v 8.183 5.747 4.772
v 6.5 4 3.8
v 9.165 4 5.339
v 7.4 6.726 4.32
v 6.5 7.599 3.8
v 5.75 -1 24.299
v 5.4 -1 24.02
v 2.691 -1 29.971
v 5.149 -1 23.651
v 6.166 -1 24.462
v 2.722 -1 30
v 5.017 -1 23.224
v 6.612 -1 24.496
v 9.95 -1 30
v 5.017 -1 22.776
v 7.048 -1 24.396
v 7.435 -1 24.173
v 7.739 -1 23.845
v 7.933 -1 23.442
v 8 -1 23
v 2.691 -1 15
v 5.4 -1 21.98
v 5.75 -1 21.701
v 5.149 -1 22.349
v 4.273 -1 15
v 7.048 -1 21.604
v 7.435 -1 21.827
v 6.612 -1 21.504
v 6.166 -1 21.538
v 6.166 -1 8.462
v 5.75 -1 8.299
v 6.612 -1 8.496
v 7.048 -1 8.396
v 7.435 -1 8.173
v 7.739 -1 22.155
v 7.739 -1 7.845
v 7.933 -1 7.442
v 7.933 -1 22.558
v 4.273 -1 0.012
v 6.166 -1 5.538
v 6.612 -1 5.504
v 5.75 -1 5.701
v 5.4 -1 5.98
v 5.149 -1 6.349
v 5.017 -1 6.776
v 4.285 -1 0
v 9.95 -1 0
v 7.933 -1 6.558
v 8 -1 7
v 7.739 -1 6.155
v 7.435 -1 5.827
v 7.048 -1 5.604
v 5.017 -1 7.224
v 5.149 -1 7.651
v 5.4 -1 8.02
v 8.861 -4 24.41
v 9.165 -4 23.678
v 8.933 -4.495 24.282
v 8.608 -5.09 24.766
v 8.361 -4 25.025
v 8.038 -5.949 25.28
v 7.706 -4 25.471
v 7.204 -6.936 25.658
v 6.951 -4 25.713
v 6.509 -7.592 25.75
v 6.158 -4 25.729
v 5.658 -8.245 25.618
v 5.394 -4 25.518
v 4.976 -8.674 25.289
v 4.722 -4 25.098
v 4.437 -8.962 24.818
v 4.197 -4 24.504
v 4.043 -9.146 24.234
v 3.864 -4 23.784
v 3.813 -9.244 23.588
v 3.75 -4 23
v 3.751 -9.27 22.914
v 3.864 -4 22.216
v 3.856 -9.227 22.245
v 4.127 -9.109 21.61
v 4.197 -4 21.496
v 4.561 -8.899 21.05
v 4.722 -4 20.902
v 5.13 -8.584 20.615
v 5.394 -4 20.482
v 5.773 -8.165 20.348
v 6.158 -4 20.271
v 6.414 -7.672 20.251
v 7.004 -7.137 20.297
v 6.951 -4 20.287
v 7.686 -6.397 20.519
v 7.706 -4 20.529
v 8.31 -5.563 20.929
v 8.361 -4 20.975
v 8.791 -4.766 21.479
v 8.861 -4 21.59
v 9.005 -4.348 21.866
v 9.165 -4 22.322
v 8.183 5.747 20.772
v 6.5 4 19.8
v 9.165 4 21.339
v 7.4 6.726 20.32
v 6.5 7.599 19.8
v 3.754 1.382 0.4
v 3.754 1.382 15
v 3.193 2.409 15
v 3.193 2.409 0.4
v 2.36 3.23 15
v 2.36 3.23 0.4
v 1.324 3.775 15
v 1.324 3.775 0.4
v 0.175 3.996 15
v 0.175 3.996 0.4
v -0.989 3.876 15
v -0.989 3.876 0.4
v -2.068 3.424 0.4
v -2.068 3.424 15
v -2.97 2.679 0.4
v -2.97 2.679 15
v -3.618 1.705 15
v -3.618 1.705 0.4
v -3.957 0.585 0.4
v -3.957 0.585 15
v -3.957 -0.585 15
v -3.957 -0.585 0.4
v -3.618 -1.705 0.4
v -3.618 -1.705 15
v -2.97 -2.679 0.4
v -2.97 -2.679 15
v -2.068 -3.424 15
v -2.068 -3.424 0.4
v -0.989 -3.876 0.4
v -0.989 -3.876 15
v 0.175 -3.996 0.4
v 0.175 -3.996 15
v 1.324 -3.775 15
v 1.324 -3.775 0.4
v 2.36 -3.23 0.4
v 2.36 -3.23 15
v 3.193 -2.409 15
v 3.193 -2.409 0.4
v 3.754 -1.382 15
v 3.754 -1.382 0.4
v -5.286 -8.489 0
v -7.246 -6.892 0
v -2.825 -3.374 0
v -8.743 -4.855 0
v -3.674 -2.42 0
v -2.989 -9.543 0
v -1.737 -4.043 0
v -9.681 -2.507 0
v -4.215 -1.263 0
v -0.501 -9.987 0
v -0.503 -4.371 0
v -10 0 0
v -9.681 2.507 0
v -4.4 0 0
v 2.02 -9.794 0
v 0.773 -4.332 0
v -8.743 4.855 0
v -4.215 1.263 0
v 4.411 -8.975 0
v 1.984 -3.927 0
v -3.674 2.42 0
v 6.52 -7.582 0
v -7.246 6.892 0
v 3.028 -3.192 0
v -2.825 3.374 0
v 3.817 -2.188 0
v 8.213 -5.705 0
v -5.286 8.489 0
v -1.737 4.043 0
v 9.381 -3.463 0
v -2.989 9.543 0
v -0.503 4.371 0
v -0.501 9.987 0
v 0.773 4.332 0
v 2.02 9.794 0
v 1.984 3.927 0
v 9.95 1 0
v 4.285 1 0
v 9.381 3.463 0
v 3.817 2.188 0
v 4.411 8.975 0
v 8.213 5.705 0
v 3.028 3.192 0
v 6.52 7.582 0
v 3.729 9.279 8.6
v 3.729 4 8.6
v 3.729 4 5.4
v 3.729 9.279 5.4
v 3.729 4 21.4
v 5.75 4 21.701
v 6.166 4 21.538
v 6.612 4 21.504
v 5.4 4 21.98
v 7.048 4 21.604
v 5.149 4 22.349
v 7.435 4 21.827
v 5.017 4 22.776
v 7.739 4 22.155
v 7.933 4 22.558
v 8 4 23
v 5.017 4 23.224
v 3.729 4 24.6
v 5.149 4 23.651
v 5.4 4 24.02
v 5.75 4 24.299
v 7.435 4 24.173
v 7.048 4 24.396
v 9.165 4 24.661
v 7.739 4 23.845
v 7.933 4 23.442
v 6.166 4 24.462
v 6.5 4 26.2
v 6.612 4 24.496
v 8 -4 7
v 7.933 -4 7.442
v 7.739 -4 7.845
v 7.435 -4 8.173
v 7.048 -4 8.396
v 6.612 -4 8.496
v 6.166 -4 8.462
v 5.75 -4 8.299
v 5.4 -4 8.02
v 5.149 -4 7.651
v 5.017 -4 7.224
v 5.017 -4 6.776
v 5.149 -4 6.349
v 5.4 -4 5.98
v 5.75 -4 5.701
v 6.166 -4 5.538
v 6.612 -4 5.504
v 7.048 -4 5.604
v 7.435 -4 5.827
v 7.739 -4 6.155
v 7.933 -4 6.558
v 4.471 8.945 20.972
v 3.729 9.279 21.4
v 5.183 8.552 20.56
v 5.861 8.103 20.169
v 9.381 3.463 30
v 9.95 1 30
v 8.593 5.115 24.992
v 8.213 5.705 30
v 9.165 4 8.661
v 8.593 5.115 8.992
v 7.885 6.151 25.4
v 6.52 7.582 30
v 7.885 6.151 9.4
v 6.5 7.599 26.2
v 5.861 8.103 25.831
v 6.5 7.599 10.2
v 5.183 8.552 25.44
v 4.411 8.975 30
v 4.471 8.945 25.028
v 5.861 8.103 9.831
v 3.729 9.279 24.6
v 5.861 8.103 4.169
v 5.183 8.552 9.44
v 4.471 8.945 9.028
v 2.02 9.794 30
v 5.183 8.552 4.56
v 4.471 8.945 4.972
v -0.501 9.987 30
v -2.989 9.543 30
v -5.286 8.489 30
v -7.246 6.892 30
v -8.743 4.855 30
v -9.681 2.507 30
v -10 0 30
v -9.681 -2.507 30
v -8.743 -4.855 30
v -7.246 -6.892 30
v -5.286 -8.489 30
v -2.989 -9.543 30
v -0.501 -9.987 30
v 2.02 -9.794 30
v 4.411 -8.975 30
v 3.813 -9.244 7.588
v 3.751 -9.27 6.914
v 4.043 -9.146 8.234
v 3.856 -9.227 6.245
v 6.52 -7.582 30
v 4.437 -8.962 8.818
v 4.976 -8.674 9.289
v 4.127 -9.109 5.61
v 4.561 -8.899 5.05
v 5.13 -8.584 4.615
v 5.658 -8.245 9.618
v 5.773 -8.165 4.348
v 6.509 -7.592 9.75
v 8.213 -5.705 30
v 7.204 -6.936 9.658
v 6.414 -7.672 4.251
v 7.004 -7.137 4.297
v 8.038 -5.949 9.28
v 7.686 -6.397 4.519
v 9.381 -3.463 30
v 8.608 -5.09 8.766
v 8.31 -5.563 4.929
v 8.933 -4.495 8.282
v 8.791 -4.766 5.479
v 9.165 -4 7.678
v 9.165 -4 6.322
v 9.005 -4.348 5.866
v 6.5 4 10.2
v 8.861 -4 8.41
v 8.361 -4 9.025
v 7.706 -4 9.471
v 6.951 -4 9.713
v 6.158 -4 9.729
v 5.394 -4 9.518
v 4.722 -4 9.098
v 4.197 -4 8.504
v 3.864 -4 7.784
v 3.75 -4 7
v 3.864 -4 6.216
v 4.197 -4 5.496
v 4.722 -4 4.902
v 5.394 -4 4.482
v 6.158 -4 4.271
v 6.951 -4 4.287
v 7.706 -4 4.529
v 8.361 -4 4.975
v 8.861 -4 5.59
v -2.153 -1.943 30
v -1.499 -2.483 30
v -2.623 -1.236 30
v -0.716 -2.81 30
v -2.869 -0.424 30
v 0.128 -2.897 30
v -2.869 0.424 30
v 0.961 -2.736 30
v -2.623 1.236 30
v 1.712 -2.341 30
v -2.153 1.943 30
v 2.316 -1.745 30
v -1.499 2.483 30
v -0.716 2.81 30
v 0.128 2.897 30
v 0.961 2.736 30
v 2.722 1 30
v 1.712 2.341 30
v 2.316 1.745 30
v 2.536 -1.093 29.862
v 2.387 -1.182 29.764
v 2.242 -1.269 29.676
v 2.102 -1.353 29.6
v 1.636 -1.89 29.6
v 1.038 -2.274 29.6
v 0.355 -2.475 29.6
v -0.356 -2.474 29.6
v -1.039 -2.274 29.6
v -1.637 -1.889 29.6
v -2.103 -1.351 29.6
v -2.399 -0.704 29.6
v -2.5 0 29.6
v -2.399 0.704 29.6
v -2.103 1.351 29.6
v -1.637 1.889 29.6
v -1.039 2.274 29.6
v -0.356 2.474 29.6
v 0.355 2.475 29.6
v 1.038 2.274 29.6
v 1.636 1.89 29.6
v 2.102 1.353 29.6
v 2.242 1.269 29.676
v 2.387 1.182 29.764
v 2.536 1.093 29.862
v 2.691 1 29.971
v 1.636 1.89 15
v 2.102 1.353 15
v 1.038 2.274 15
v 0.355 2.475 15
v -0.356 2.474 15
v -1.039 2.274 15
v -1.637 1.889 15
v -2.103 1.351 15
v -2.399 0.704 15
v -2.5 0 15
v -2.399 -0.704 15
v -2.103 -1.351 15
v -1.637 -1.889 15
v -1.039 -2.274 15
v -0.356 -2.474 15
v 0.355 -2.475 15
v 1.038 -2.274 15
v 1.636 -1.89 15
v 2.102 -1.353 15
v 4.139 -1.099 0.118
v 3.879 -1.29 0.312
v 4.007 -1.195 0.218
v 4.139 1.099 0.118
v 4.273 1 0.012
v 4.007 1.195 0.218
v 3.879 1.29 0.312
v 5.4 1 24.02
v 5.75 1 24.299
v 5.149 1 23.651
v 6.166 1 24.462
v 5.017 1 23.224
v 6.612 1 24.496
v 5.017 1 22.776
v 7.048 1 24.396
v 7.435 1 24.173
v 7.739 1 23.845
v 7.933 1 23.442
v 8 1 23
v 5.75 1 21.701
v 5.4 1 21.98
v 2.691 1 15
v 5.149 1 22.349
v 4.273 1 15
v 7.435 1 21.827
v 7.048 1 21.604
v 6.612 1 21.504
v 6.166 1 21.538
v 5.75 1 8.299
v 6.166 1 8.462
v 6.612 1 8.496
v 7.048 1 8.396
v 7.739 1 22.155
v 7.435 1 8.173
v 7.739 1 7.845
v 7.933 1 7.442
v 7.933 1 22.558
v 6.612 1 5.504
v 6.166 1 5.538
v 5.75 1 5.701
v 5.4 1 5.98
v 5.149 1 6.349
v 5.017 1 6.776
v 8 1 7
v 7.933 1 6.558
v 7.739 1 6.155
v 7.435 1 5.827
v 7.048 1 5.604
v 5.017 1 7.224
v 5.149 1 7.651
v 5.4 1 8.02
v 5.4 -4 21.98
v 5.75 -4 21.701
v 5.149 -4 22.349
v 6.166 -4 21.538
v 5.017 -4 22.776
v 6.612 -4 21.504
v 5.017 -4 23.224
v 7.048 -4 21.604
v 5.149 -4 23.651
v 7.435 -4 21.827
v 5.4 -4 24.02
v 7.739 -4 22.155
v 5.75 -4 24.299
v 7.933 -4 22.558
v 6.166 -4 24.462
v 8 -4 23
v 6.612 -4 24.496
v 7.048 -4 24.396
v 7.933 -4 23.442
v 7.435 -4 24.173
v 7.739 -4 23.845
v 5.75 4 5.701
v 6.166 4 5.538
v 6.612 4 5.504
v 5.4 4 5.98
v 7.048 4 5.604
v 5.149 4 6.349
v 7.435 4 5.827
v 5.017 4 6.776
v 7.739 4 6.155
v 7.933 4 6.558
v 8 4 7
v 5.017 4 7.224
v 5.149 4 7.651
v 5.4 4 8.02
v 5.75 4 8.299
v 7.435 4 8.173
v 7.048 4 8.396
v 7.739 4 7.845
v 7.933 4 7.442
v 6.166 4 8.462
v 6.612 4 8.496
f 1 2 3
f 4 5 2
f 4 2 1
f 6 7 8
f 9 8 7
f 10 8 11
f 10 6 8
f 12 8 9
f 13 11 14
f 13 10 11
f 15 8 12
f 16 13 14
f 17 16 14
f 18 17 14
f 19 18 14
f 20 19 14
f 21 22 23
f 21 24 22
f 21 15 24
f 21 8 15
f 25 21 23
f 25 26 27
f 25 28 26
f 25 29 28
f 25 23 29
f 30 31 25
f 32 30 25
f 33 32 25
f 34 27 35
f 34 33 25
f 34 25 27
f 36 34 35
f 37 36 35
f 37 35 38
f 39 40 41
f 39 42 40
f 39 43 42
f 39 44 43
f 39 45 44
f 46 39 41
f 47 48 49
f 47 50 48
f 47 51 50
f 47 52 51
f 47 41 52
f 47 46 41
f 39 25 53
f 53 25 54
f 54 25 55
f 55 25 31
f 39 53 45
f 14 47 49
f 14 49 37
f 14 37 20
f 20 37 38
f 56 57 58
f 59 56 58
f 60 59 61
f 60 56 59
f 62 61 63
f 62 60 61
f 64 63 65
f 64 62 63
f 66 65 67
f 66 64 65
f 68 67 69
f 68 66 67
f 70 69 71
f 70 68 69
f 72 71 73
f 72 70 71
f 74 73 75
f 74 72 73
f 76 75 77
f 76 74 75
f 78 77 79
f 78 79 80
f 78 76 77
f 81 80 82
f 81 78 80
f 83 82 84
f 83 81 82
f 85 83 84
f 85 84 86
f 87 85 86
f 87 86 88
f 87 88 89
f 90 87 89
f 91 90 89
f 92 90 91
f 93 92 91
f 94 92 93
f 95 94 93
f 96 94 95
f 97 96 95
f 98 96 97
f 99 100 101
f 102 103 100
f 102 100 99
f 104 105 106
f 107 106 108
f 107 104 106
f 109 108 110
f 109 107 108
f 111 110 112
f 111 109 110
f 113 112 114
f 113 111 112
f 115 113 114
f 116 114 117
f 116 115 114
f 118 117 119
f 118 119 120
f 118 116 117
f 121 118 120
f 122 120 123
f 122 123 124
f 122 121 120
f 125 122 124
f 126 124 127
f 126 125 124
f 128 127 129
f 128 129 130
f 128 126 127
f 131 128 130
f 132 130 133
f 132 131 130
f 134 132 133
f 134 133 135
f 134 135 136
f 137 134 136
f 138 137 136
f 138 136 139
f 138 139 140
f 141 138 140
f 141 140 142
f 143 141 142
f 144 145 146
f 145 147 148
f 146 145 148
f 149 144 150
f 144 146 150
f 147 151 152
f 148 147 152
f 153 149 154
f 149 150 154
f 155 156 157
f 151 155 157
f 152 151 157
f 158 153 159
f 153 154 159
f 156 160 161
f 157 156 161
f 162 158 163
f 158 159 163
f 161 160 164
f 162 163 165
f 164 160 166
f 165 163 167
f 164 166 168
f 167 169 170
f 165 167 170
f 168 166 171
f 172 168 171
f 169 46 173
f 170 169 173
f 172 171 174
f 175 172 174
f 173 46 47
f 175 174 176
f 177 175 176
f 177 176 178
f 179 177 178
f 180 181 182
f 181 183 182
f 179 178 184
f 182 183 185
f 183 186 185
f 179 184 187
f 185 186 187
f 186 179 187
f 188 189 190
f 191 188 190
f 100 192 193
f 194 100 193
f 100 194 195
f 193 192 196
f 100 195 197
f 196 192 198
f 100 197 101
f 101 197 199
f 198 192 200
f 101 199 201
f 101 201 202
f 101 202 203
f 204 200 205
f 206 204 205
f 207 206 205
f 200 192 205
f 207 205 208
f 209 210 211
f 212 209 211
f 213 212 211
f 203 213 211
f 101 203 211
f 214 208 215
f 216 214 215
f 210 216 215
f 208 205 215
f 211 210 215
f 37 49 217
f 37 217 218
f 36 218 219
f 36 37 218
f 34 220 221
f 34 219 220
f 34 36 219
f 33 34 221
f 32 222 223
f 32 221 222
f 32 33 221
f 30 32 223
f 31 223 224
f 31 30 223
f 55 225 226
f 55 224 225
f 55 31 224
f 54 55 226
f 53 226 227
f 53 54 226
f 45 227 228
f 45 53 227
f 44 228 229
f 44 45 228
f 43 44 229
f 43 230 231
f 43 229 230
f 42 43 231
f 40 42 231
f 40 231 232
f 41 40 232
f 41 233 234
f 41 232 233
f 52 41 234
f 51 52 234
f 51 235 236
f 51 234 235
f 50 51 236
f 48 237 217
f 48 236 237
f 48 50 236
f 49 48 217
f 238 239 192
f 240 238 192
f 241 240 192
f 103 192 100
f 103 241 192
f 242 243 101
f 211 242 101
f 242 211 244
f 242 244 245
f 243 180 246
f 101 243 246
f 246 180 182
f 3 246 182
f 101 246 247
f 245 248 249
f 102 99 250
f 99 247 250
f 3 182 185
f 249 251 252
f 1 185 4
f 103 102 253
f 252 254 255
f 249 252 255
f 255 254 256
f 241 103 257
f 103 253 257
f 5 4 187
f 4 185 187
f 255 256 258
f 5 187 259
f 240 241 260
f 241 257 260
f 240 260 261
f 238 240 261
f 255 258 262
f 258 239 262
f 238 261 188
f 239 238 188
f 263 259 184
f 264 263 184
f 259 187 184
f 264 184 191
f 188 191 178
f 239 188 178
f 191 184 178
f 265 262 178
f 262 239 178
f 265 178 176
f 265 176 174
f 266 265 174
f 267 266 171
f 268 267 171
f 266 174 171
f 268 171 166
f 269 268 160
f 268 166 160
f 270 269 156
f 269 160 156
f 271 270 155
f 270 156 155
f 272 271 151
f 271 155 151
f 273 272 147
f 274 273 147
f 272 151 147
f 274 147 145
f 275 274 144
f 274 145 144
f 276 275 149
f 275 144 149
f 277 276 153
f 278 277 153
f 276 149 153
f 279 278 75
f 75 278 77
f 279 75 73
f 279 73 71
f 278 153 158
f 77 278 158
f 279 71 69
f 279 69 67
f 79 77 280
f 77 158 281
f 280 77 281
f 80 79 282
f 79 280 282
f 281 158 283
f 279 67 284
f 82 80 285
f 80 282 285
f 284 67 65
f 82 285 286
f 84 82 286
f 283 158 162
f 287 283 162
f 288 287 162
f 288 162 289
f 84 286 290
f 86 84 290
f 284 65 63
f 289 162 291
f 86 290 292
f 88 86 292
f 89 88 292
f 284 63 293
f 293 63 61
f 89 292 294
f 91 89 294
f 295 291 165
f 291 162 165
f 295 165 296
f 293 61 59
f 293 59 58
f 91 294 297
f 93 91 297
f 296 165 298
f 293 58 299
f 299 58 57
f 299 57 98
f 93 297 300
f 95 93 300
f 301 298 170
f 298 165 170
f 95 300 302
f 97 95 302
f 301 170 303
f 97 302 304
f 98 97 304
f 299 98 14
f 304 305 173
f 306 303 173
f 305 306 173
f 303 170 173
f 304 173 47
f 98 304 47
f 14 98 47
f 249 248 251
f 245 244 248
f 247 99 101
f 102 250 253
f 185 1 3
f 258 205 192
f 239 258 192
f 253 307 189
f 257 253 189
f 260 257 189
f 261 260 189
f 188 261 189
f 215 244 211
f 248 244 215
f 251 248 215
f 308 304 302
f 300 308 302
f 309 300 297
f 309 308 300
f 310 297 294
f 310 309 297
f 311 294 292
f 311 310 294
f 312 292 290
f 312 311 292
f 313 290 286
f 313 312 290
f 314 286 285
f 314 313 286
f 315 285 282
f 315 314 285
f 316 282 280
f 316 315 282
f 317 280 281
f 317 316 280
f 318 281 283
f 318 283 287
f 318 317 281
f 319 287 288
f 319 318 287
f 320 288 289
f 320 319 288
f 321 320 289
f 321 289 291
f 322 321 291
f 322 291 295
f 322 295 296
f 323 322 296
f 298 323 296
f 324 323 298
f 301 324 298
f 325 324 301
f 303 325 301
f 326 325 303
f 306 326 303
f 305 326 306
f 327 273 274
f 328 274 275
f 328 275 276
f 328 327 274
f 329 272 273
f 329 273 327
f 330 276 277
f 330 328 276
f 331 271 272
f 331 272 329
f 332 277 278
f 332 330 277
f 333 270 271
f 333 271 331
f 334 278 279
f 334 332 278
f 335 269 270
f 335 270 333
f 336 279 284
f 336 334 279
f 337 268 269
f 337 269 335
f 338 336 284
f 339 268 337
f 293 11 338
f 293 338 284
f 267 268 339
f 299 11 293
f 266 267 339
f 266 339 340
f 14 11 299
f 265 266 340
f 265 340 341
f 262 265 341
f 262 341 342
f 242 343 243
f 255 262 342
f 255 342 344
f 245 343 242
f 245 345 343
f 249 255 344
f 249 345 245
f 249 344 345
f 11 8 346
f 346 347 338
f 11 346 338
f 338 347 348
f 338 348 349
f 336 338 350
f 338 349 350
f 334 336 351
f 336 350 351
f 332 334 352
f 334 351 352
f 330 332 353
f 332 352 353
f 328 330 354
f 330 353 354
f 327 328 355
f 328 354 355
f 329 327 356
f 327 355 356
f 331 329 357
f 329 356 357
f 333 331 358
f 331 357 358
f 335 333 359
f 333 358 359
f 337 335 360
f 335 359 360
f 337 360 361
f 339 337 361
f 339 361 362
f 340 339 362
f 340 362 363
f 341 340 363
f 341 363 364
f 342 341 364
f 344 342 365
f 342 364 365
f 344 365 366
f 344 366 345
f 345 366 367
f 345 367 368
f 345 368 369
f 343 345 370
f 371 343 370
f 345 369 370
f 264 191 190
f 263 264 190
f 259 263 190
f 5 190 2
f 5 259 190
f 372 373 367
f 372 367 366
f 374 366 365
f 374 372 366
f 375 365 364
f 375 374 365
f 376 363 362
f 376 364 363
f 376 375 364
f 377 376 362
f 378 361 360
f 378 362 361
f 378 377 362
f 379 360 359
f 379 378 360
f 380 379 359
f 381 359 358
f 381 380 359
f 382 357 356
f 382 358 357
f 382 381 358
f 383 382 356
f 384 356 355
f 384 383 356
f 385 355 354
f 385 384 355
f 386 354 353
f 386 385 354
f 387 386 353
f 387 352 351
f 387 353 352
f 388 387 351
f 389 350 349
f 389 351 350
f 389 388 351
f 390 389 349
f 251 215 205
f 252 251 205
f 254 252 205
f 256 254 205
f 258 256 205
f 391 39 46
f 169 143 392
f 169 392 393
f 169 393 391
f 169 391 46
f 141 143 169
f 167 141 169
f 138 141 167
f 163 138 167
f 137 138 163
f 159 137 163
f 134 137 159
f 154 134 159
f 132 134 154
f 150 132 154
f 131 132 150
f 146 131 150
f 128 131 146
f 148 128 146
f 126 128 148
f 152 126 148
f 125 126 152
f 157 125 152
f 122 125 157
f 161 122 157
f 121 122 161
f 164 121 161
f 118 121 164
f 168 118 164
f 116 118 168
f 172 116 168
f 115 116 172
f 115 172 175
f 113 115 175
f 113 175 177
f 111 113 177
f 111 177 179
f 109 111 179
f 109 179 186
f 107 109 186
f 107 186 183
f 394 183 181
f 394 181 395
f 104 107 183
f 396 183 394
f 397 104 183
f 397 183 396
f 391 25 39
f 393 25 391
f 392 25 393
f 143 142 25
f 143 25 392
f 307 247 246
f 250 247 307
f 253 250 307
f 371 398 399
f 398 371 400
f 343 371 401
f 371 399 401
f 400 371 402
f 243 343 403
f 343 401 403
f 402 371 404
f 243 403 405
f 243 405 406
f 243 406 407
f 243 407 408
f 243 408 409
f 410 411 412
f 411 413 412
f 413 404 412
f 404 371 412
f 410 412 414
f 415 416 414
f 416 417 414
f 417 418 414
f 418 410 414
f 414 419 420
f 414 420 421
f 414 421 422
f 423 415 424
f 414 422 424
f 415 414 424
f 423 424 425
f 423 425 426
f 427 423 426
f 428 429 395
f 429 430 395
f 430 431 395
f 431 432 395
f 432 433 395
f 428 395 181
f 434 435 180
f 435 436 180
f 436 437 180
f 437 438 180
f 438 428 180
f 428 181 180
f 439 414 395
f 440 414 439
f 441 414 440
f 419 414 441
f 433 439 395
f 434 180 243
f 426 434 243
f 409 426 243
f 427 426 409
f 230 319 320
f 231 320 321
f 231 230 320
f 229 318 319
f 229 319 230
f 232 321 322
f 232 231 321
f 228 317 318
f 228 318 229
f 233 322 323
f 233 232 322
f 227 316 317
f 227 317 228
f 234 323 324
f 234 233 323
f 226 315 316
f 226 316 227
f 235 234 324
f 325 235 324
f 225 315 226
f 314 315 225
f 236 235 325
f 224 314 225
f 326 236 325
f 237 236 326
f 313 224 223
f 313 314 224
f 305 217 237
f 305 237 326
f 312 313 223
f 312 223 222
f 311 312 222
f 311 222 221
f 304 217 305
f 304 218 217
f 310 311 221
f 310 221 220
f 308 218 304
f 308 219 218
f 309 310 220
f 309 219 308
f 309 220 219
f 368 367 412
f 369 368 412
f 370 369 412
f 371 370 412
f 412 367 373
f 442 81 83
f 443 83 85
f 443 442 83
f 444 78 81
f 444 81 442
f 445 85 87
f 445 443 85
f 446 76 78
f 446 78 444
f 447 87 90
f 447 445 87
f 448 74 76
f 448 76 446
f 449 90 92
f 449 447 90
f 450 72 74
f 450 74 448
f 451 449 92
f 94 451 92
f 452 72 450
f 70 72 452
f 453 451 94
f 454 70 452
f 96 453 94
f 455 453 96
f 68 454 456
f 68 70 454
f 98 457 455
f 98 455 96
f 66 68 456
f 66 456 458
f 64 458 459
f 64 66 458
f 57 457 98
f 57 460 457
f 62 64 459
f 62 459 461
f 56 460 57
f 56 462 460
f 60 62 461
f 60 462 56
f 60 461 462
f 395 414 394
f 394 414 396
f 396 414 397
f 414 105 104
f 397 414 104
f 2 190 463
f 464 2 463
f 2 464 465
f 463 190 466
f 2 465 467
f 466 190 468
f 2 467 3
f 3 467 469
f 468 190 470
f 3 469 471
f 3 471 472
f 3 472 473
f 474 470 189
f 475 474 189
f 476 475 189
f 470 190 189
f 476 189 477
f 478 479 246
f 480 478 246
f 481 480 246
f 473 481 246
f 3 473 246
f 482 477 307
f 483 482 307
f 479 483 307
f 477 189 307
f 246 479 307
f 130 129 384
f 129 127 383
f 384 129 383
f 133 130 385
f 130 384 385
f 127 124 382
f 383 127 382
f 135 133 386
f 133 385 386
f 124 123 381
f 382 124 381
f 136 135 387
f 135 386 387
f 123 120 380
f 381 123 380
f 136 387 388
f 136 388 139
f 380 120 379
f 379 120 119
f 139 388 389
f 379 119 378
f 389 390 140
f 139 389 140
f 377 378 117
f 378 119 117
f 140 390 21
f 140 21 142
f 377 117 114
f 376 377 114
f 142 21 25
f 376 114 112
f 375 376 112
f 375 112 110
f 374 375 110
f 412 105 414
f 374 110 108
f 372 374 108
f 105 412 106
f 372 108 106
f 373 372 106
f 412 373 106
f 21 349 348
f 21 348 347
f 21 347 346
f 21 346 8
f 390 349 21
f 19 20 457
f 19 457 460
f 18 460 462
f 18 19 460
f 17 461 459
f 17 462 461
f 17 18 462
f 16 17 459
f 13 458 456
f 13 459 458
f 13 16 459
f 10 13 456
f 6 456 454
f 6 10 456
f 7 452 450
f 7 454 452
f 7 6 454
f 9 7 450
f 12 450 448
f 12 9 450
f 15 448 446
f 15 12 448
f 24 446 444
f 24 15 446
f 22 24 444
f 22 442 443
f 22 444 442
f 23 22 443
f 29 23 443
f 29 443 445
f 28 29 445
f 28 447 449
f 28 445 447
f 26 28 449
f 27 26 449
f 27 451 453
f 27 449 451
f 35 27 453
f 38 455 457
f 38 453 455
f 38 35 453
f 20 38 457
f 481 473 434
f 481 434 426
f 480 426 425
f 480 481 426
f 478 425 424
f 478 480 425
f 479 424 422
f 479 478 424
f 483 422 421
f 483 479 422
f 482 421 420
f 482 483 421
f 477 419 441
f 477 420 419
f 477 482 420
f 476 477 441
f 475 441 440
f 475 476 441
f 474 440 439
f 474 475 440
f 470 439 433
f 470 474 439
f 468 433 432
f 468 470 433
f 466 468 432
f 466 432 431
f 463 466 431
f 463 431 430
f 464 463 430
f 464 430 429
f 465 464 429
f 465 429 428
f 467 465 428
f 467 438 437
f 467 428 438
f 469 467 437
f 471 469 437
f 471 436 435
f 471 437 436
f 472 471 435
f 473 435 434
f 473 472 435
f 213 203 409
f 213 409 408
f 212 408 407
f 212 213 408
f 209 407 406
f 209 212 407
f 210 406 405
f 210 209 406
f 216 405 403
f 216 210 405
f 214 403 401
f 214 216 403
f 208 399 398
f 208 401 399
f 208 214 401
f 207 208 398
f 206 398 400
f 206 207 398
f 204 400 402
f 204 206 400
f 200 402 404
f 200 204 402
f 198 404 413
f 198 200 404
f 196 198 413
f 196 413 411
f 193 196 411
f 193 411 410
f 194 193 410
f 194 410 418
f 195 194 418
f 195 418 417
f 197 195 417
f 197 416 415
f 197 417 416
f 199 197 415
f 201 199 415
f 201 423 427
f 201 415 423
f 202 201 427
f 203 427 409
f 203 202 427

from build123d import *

# Parameters (mm, degrees)
CYLINDER010_R            = 2.75
CYLINDER010_DEPTH        = 20
PRISM002_DEPTH           = 20
PRISM002_PLACEMENT_ANGLE = 30
CYLINDER009_R            = 1.5
CYLINDER009_DEPTH        = 20
FUSION009_ROLL_ANGLE     = 90
FUSION008_ROLL_ANGLE     = 90
BOX001_W                 = 13
BOX001_H                 = 2
BOX001_DEPTH             = 32
CYLINDER008_R            = 2.5
CYLINDER008_DEPTH        = 32
CYLINDER007_R            = 4
CYLINDER007_DEPTH        = 16
CYLINDER006_R            = 10
CYLINDER006_DEPTH        = 30
CHAMFER003_SIZE          = 0.4


with BuildPart() as cylinder010:
    # Cylinder010 → Cylinder010 (new body)
    with BuildSketch(Plane.XY.offset(4)):
        Circle(CYLINDER010_R)
    extrude(amount=CYLINDER010_DEPTH)


with BuildPart() as prism002:
    # Prism002 → Prism002 (new body)
    with BuildSketch(Plane.XY):
        Polygon((3.2, 0), (1.6, 2.771281), (-1.6, 2.771281), (-3.2, 0), (-1.6, -2.771281), (1.6, -2.771281), align=None)
    extrude(amount=PRISM002_DEPTH)


with BuildPart() as prism002_1:
    # Prism002 placement: moved
    add(prism002.part.moved(Location((0, 0, -24))).rotate(Axis((0, 0, -24), (0, 0, 1)), PRISM002_PLACEMENT_ANGLE))


with BuildPart() as cylinder009:
    # Cylinder009 → Cylinder009 (new body)
    with BuildSketch(Plane.XY.offset(-7)):
        Circle(CYLINDER009_R)
    extrude(amount=CYLINDER009_DEPTH)


with BuildPart() as fusion009:
    # Fusion009 base: copy of Cylinder009
    add(cylinder009.part)

    # Fusion009: union Cylinder010, Prism002
    add(cylinder010.part)
    add(prism002_1.part)


with BuildPart() as fusion009_1:
    # Fusion009 roll: moved
    add(fusion009.part.rotate(Axis((0, 0, 0), (1, 0, 0)), FUSION009_ROLL_ANGLE))


with BuildPart() as fusion009_2:
    # Fusion009 placement: moved
    add(fusion009_1.part.moved(Location((6.5, 0, 23))))


with BuildPart() as fusion010:
    # Fusion008 base: copy of Cylinder009
    add(cylinder009.part)

    # Fusion008: union Cylinder010, Prism002
    add(cylinder010.part)
    add(prism002_1.part)


with BuildPart() as fusion010_1:
    # Fusion008 roll: moved
    add(fusion010.part.rotate(Axis((0, 0, 0), (1, 0, 0)), FUSION008_ROLL_ANGLE))


with BuildPart() as fusion010_2:
    # Fusion008 placement: moved
    add(fusion010_1.part.moved(Location((6.5, 0, 7))))

    # Fusion010: union Fusion009
    add(fusion009_2.part)


with BuildPart() as cube001:
    # Box001 → Box001 (new body)
    with BuildSketch(Plane(origin=(0, -1, -1), x_dir=(1, 0, 0), z_dir=(0, 0, 1))):
        with Locations((6.5, 1)):
            Rectangle(BOX001_W, BOX001_H)
    extrude(amount=BOX001_DEPTH)


with BuildPart() as cylinder008:
    # Cylinder008 → Cylinder008 (new body)
    with BuildSketch(Plane.XY.offset(-1)):
        Circle(CYLINDER008_R)
    extrude(amount=CYLINDER008_DEPTH)


with BuildPart() as fusion007:
    # Cylinder007 → Cylinder007 (new body)
    with BuildSketch(Plane.XY.offset(-1)):
        Circle(CYLINDER007_R)
    extrude(amount=CYLINDER007_DEPTH)

    # Fusion007: union Cube001, Cylinder008
    add(cube001.part)
    add(cylinder008.part)


with BuildPart() as chamfer003:
    # Cylinder006 → Cylinder006 (new body)
    with BuildSketch(Plane.XY):
        Circle(CYLINDER006_R)
    extrude(amount=CYLINDER006_DEPTH)

    # Cut005: cut Fusion007
    add(fusion007.part, mode=Mode.SUBTRACT)

    # Cut006: cut Fusion010
    add(fusion010_2.part, mode=Mode.SUBTRACT)

    # Chamfer003
    chamfer003_edges = [chamfer003.edges().sort_by_distance(p)[0] for p in [
        (-2.5, 0, 30),
        (3.872983, 1, 7.5),
        (2.291288, 1, 22.5),
        (3.872983, -1, 7.5),
        (2.291288, -1, 22.5),
        (-4, 0, 0),
    ]]
    chamfer(chamfer003_edges, length=CHAMFER003_SIZE)


solid = chamfer003.part
